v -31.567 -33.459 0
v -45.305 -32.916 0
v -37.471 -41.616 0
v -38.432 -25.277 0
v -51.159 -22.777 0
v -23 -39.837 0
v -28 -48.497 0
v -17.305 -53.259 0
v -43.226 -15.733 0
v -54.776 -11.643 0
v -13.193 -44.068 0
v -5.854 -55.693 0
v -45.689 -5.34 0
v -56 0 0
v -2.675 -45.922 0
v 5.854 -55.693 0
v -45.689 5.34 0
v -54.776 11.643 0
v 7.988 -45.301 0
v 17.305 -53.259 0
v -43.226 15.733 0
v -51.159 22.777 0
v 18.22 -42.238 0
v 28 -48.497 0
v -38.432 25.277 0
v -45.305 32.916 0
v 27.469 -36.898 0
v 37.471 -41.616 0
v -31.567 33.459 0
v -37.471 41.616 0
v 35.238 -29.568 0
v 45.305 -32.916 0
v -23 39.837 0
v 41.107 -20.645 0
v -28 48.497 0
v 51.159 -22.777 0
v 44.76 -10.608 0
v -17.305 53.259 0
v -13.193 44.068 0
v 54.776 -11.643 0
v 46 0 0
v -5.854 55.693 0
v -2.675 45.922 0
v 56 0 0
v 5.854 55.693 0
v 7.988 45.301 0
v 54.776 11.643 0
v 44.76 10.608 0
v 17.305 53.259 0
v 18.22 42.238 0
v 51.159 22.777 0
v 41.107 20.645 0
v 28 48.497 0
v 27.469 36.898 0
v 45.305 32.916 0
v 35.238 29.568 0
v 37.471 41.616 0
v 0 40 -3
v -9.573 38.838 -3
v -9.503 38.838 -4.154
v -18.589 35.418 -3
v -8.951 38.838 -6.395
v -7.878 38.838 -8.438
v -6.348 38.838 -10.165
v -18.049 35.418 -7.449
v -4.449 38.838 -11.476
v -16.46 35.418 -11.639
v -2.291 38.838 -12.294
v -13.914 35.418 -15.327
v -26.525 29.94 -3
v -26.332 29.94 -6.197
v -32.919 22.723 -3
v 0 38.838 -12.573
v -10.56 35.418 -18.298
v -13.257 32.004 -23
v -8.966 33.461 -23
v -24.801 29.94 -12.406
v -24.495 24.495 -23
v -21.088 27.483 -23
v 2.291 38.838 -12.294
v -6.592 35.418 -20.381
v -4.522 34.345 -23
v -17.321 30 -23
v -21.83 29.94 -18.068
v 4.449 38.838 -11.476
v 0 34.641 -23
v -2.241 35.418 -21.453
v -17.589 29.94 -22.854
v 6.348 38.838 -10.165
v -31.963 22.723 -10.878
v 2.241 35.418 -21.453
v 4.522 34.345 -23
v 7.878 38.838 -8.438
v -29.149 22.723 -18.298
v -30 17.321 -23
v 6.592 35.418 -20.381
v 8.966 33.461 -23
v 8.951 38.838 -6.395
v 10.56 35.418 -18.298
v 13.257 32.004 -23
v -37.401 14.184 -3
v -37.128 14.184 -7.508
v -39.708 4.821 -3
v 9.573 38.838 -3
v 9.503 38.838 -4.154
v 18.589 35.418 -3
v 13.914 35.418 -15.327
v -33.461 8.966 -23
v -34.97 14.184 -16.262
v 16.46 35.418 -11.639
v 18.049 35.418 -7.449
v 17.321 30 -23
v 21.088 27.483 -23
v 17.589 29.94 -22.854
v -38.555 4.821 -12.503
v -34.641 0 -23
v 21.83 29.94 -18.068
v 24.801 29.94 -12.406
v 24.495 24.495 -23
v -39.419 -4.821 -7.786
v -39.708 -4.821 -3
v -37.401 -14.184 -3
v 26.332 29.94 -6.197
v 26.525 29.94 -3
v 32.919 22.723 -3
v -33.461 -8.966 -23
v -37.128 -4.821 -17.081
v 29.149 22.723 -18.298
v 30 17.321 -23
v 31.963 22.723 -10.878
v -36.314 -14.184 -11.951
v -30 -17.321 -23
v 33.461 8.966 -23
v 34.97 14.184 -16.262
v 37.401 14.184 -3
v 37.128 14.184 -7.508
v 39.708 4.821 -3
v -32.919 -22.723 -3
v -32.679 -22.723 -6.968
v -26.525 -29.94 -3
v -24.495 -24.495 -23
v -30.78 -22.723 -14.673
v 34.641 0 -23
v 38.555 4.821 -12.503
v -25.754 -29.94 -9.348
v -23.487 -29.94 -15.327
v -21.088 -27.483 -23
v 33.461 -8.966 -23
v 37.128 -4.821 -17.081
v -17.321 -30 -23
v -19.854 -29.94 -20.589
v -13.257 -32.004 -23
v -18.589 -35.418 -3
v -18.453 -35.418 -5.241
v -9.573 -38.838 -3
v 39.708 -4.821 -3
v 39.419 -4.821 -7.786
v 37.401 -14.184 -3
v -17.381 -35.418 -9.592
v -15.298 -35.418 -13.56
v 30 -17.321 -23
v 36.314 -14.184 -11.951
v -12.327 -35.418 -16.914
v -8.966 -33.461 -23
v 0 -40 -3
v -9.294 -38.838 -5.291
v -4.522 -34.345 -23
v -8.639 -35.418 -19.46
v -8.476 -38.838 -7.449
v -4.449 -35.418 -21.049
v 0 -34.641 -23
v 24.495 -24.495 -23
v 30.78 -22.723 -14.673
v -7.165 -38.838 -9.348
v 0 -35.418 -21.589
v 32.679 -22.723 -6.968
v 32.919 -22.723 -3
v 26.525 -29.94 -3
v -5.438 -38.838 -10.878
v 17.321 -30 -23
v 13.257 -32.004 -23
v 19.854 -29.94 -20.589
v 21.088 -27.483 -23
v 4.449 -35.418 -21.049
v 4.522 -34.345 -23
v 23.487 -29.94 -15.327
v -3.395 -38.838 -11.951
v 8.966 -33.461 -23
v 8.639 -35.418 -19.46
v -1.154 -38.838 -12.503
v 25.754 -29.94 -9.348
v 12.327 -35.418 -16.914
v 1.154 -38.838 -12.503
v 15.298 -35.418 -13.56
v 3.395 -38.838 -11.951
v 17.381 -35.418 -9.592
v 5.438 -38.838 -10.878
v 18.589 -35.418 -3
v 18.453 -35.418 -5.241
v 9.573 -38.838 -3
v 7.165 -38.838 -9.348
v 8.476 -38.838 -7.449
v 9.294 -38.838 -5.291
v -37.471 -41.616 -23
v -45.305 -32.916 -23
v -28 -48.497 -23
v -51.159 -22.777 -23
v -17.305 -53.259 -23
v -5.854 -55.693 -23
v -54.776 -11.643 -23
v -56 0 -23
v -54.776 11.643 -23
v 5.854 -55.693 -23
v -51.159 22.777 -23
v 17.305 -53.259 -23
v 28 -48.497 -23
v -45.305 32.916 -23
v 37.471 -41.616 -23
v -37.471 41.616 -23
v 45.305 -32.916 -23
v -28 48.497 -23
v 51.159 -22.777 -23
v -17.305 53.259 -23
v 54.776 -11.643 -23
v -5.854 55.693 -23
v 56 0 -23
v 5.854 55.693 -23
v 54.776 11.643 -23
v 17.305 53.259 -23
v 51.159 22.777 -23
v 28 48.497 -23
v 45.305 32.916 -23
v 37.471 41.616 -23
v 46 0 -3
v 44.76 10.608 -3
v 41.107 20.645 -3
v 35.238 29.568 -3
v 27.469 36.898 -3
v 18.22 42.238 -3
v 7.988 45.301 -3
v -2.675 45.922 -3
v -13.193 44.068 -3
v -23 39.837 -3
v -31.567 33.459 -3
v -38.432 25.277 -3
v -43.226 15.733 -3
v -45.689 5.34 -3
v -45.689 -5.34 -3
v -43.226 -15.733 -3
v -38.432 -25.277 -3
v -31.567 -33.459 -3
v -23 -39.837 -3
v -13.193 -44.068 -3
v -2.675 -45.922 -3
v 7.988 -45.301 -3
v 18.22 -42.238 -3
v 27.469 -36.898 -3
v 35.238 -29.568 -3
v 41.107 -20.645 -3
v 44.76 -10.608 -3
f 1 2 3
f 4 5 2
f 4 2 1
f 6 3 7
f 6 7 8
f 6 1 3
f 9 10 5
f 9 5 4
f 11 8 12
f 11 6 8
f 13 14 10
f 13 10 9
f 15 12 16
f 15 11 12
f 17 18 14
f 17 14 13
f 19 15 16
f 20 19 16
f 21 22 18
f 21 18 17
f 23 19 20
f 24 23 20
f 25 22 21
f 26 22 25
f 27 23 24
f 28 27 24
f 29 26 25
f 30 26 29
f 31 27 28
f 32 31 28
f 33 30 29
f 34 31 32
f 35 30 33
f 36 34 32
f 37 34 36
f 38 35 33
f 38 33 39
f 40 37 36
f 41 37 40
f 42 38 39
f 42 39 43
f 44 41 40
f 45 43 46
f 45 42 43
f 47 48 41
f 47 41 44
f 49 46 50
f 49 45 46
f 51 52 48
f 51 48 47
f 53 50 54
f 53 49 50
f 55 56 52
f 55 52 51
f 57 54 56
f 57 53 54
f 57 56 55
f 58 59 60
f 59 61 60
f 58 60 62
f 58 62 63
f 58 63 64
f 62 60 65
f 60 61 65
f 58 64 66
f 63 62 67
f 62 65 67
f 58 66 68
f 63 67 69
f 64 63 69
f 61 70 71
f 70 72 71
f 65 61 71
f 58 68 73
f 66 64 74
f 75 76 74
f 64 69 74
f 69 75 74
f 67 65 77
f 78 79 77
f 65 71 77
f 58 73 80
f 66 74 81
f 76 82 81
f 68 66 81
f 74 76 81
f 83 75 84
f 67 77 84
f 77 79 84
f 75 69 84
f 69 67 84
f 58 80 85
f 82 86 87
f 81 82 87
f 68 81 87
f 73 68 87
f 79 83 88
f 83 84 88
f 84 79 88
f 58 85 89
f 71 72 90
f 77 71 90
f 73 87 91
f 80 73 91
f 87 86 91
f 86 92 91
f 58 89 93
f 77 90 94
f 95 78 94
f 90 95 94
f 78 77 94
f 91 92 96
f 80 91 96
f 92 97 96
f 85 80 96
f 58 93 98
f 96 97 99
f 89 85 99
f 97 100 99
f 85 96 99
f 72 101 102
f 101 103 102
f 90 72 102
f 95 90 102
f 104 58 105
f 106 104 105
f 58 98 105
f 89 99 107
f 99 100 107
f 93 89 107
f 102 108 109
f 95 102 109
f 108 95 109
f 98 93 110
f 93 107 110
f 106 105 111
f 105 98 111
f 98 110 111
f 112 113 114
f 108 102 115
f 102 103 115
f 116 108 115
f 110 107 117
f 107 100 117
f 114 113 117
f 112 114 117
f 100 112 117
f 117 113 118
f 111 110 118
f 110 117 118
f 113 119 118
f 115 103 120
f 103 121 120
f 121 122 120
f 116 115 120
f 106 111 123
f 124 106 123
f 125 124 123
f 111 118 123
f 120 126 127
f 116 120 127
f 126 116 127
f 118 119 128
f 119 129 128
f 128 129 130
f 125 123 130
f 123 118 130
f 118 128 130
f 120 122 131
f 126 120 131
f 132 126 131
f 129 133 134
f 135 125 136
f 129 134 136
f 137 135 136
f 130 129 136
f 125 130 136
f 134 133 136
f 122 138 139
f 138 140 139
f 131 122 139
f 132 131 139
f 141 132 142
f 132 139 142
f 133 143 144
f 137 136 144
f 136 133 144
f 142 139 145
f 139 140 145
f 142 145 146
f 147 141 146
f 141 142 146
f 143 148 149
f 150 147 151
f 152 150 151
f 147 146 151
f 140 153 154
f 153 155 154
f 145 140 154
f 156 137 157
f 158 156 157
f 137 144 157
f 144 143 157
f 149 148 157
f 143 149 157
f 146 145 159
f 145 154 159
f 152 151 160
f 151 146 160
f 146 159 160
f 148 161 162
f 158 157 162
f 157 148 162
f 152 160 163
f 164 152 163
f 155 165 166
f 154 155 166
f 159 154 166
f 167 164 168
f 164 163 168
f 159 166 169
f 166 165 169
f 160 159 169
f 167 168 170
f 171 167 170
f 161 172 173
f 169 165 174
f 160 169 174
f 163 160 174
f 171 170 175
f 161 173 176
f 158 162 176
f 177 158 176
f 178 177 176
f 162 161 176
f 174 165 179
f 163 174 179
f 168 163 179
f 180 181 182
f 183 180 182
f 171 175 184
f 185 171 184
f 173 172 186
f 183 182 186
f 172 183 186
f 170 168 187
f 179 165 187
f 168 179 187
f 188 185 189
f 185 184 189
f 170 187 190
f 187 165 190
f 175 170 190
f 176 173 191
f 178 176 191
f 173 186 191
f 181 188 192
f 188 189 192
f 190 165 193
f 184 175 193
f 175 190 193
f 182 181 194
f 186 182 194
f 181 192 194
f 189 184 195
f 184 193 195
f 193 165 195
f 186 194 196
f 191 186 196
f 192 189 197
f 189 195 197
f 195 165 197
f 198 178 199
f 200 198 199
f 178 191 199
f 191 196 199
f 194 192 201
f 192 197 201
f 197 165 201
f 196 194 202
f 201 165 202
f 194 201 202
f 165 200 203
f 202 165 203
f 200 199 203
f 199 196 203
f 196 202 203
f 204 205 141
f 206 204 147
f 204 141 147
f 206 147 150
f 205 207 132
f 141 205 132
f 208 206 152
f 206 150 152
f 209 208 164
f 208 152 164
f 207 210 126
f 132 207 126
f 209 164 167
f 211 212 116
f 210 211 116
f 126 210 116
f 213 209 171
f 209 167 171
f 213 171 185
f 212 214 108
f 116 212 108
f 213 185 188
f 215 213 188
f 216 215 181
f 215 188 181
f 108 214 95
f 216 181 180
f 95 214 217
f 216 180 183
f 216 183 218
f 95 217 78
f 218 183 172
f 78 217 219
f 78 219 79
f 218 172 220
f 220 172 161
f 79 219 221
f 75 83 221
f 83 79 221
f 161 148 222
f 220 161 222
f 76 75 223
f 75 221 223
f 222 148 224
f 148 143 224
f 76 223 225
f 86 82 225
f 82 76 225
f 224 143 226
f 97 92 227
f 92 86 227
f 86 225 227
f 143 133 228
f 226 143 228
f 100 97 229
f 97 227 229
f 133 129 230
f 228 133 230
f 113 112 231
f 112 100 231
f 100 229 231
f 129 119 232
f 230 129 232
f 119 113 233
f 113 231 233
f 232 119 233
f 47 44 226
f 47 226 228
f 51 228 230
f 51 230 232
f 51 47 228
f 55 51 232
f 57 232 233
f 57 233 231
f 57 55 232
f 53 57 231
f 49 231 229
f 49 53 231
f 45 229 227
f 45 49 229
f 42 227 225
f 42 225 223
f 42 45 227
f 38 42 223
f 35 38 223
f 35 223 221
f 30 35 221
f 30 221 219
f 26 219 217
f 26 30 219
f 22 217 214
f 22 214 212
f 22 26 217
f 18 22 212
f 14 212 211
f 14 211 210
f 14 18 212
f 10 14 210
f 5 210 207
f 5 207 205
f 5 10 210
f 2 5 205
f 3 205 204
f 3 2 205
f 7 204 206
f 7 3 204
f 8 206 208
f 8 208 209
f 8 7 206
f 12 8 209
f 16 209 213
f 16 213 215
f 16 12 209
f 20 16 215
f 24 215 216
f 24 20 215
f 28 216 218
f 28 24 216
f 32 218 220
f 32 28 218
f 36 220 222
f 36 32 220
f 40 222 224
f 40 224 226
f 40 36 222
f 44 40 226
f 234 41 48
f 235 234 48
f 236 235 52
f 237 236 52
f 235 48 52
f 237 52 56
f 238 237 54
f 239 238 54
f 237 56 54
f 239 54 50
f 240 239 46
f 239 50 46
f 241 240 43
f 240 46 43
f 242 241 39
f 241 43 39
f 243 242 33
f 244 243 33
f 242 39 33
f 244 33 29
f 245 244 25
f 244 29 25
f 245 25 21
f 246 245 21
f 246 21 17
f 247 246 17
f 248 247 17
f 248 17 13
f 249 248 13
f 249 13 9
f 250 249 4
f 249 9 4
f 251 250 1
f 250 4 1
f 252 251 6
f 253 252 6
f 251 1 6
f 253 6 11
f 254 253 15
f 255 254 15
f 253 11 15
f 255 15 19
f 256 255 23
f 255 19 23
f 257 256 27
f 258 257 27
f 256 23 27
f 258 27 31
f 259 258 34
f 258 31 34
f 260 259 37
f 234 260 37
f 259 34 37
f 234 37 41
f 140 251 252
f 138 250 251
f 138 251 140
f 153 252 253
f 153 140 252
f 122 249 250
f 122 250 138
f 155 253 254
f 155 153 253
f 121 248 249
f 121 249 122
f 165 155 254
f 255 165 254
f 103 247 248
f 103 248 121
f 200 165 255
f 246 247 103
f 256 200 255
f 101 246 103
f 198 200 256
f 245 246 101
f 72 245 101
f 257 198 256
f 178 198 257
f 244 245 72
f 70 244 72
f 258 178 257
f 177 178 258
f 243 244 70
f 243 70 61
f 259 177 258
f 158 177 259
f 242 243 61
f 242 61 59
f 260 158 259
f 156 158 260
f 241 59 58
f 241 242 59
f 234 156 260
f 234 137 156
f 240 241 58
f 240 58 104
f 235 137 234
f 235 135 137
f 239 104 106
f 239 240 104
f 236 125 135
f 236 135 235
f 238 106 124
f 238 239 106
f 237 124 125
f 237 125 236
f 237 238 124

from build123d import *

# Parameters (mm, degrees)
F0_R     = 56
F1_DEPTH = 23
F2_R     = 46
F3_DEPTH = 3
F5_ANGLE = -180


with BuildPart() as f1:
    # F0 (on Top) → F1 (new body)
    with BuildSketch(Plane.XY):
        Circle(F0_R)
    extrude(amount=-F1_DEPTH)

    # F2 (on face) → F3 (cut)
    with BuildSketch(Plane.XY):
        Circle(F2_R)
    extrude(amount=-F3_DEPTH, mode=Mode.SUBTRACT)

    # F4 (on face) → F5 (revolve, cut)
    with BuildSketch(Plane.XY.offset(-3)):
        with BuildLine():
            Line((0, -40), (0, 40))
            ThreePointArc((0, 40), (-40, 0), (0, -40))
        make_face()
    revolve(axis=Axis((0, 0, -3), (0, 1, 0)), revolution_arc=F5_ANGLE, mode=Mode.SUBTRACT)


solid = f1.part
